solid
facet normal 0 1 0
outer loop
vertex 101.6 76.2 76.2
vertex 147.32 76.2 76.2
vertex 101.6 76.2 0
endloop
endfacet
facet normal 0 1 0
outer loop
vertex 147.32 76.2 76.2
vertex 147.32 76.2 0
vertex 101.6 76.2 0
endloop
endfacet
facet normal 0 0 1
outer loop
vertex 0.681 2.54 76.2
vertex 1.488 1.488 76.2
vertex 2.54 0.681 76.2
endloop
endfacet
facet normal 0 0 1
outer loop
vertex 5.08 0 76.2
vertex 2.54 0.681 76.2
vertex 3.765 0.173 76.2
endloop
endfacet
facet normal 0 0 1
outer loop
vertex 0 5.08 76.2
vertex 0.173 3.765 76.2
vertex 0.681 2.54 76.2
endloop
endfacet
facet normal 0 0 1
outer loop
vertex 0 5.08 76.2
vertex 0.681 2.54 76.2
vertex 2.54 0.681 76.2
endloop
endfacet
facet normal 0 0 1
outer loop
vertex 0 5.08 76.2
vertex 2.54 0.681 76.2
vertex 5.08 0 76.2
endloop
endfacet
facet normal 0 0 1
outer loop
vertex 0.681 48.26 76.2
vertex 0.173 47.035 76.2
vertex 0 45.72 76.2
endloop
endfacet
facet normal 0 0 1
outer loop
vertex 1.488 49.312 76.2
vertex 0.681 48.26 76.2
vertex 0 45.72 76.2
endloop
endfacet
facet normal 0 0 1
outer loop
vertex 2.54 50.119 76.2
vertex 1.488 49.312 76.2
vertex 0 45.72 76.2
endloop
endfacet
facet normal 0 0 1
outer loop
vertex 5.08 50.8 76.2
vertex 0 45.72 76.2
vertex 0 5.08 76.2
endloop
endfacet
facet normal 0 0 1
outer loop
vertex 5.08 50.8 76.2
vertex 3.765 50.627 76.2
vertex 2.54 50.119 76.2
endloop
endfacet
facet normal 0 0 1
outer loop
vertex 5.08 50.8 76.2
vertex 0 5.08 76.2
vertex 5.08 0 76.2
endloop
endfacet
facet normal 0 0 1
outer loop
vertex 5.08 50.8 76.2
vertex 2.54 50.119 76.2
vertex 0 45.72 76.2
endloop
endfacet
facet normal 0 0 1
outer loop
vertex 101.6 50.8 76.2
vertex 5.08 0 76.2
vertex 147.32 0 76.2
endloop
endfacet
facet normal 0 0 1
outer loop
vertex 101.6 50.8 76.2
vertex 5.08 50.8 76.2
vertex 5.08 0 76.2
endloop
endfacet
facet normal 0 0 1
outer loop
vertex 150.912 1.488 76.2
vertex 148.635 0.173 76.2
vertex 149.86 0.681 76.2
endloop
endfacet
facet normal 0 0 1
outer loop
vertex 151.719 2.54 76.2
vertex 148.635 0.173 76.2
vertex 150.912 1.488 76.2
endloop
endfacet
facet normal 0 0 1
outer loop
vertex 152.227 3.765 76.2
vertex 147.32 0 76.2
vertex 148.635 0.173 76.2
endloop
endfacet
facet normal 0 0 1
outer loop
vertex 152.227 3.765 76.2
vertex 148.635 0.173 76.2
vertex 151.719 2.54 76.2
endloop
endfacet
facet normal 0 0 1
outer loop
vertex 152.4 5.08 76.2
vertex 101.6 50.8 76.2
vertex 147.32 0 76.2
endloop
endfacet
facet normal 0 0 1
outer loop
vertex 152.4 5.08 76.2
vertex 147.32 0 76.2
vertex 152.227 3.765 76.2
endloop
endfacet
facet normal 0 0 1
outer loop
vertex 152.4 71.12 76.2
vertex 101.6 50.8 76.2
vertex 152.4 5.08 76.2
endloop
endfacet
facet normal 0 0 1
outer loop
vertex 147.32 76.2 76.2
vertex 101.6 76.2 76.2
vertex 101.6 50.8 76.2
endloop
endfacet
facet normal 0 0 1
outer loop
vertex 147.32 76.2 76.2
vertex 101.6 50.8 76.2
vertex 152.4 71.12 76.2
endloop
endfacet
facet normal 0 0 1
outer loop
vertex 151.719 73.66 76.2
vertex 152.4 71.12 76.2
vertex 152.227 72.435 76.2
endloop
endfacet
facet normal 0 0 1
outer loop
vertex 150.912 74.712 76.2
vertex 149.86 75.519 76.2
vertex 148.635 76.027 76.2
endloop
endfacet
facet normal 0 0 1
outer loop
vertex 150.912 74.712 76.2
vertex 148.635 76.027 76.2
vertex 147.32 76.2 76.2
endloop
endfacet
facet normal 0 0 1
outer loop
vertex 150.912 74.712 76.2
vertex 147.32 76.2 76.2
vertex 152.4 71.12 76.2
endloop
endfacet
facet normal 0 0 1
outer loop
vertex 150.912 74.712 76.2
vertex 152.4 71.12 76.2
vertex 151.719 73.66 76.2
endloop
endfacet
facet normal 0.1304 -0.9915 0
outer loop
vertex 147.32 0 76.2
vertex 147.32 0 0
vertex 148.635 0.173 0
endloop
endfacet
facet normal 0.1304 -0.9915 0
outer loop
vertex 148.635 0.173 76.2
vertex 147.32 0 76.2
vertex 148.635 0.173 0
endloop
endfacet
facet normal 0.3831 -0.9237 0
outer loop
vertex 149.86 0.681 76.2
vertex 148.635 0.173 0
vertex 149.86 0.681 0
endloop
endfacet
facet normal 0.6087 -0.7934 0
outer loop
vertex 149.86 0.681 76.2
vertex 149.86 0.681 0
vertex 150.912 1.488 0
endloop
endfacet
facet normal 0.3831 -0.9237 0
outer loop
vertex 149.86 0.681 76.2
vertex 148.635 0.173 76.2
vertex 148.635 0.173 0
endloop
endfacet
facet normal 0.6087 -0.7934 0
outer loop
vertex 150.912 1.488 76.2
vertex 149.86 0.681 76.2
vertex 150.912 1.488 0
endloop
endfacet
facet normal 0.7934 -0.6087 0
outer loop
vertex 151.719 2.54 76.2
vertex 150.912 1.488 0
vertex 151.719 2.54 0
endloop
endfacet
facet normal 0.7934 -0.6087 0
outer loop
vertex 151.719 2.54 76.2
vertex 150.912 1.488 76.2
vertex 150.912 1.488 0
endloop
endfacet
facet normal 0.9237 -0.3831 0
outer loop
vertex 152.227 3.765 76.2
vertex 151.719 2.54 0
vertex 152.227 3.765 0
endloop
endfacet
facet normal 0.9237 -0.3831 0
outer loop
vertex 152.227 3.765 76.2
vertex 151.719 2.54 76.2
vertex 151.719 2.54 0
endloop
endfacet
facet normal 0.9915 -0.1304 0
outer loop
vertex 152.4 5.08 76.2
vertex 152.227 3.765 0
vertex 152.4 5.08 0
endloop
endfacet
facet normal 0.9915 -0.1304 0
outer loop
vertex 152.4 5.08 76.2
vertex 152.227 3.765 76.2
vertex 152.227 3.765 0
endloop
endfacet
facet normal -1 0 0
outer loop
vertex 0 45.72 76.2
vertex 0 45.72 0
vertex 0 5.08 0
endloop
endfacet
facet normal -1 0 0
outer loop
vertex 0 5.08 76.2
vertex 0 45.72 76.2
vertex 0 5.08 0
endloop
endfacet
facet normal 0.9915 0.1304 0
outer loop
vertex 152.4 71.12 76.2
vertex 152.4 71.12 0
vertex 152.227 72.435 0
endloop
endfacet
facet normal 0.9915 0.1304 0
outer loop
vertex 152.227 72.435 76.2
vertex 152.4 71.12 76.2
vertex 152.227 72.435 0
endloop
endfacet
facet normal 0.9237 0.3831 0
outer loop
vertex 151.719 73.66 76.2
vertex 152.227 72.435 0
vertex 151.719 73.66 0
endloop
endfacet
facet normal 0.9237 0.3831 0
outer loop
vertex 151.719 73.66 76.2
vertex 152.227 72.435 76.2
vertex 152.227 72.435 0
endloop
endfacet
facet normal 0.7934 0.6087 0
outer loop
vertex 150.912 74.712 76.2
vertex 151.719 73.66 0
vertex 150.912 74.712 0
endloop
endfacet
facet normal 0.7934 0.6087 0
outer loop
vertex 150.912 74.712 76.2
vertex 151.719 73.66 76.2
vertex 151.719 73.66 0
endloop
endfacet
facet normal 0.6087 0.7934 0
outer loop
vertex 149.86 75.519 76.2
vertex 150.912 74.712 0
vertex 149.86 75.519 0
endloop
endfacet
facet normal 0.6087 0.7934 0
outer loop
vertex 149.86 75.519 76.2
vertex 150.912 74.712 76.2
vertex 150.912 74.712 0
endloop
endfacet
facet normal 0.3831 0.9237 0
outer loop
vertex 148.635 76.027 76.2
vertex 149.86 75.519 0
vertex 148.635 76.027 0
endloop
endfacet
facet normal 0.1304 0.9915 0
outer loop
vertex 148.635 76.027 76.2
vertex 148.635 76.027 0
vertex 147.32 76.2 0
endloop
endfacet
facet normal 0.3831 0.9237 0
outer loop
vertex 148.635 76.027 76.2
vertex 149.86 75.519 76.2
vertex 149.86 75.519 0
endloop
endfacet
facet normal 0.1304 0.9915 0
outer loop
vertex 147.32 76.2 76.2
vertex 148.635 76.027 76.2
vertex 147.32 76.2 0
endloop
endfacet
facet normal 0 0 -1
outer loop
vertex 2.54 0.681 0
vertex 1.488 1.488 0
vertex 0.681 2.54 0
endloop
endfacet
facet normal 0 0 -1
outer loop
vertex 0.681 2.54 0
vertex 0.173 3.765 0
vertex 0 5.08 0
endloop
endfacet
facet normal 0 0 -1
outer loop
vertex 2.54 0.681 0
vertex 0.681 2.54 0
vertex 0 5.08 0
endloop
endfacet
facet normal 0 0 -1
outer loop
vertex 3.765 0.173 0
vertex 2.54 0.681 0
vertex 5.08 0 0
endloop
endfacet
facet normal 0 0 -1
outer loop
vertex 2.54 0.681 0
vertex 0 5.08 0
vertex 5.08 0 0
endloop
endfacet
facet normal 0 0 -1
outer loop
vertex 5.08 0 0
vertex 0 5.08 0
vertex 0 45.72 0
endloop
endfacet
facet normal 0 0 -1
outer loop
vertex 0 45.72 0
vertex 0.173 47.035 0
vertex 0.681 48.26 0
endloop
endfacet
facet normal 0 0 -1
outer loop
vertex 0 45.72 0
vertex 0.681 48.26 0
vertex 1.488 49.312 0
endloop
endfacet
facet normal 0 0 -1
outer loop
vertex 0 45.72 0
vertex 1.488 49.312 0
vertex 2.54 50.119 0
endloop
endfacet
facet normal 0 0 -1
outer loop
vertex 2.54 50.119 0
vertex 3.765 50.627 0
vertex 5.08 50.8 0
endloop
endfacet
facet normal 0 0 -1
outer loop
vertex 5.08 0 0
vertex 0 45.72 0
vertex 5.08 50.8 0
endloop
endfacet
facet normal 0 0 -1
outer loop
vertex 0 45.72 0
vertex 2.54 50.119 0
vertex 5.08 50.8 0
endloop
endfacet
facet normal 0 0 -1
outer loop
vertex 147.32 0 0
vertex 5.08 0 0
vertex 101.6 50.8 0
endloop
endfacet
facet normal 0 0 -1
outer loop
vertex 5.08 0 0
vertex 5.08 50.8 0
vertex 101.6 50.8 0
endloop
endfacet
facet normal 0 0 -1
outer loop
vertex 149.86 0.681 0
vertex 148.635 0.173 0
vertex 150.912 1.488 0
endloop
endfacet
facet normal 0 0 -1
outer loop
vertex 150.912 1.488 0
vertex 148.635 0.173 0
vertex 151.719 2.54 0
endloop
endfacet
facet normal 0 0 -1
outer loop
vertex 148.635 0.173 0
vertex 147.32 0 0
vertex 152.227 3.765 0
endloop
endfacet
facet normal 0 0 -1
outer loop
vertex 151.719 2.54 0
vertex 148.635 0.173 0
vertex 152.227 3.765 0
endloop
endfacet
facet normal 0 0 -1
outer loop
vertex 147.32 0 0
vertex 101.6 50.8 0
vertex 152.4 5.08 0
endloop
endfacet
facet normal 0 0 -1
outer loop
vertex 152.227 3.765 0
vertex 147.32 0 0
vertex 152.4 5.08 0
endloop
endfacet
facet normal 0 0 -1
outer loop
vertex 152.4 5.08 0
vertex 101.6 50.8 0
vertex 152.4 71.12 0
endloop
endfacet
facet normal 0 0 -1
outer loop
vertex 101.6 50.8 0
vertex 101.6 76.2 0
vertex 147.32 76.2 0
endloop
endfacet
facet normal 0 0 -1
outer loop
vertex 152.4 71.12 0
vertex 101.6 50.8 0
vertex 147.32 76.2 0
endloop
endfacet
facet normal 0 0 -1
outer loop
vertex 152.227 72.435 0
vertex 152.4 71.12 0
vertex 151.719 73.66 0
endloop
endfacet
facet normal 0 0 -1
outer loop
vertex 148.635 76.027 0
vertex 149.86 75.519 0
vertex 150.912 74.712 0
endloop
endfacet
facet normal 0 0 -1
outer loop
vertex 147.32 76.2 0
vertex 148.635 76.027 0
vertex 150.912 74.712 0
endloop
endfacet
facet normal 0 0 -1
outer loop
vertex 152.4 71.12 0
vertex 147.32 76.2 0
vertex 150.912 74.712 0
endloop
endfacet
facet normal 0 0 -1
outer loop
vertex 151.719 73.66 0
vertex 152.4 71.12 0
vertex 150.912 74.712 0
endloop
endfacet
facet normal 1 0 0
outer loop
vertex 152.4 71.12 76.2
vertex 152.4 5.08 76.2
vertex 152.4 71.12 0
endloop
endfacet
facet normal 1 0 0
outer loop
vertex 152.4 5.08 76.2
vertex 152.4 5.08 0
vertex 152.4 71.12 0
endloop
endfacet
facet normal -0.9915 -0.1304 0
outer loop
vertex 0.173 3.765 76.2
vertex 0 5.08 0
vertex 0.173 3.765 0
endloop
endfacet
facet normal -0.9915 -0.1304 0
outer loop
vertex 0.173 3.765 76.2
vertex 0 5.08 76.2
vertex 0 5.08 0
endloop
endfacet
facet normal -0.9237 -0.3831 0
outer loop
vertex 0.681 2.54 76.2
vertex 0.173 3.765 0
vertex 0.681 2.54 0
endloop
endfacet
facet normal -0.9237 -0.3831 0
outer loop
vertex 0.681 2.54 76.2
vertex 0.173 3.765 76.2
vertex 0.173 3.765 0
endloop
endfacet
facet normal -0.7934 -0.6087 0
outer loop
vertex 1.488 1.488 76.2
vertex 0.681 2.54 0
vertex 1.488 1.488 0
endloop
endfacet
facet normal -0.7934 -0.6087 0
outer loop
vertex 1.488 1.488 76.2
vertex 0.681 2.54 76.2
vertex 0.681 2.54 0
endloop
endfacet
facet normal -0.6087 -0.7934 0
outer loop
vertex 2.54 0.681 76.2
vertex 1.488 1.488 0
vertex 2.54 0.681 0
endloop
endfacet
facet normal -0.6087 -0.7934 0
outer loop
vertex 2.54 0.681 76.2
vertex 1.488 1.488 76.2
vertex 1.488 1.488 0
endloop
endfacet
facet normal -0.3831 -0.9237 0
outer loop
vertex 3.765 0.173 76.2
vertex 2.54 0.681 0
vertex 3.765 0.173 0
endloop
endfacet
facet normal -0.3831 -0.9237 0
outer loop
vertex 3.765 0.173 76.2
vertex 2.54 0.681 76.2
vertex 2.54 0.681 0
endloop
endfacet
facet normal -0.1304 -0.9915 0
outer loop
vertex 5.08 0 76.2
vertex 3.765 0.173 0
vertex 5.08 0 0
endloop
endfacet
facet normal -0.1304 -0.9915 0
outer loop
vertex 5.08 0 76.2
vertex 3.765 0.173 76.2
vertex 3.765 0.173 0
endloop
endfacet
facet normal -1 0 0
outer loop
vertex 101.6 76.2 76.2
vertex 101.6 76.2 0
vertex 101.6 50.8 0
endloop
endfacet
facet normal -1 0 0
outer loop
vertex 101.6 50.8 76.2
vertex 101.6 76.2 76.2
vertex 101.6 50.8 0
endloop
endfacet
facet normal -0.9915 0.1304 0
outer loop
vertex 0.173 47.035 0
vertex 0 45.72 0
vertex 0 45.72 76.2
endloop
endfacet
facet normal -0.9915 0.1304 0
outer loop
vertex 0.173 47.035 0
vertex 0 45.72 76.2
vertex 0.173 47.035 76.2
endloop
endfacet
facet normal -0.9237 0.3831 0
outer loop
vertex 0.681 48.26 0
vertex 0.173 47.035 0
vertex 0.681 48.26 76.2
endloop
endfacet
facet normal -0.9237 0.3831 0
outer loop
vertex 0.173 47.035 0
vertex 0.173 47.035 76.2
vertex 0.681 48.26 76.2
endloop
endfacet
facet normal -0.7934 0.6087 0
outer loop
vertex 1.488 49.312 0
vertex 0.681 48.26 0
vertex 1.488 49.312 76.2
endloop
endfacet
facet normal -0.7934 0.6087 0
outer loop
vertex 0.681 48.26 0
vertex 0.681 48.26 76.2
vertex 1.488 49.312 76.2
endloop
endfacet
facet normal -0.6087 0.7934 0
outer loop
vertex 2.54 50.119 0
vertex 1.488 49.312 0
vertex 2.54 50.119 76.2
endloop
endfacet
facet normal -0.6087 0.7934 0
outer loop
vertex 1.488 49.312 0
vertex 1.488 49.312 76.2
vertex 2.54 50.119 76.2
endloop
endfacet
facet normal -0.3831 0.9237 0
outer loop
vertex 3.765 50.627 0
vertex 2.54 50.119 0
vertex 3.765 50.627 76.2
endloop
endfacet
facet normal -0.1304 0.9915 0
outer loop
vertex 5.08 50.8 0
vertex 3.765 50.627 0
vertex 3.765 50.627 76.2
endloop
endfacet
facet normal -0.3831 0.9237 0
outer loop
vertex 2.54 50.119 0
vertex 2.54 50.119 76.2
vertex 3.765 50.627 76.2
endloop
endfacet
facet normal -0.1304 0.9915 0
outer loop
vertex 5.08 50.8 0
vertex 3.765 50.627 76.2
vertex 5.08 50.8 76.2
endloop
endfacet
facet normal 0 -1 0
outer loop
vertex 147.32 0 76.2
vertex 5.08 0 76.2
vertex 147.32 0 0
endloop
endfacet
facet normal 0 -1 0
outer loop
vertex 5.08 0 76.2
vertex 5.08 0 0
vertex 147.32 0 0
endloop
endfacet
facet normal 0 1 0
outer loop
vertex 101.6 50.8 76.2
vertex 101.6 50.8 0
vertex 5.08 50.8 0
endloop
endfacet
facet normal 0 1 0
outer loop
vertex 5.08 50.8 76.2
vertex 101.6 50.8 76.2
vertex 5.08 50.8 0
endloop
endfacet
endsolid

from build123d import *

# Parameters (mm, degrees)
F1_DEPTH = 50.8
F2_R     = 5.08
F3_R     = 5.08
F4_DEPTH = 76.2
F5_R     = 5.08


with BuildPart() as f1:
    # F0 (on Top) → F1 (new body)
    with BuildSketch(Plane.XY):
        Polygon((0, 50.8), (0, 0), (152.4, 0), (152.4, 76.2), (101.6, 76.2), (101.6, 50.8), align=None)
    extrude(amount=F1_DEPTH)

    # F2
    f2_edges = [f1.edges().sort_by_distance(p)[0] for p in [
        (0, 0, 25.4),
        (0, 50.8, 25.4),
        (152.4, 0, 25.4),
    ]]
    fillet(f2_edges, radius=F2_R)

    # F3
    f3_edges = [f1.edges().sort_by_distance(p)[0] for p in [
        (152.4, 76.2, 25.4),
    ]]
    fillet(f3_edges, radius=F3_R)

    # F0 (on Top) → F4 (join)
    with BuildSketch(Plane.XY):
        Polygon((0, 50.8), (0, 0), (152.4, 0), (152.4, 76.2), (101.6, 76.2), (101.6, 50.8), align=None)
    extrude(amount=F4_DEPTH)

    # F5
    f5_edges = [f1.edges().sort_by_distance(p)[0] for p in [
        (152.4, 76.2, 38.1),
        (152.4, 0, 38.1),
        (0, 0, 38.1),
        (0, 50.8, 38.1),
    ]]
    fillet(f5_edges, radius=F5_R)


solid = f1.part
